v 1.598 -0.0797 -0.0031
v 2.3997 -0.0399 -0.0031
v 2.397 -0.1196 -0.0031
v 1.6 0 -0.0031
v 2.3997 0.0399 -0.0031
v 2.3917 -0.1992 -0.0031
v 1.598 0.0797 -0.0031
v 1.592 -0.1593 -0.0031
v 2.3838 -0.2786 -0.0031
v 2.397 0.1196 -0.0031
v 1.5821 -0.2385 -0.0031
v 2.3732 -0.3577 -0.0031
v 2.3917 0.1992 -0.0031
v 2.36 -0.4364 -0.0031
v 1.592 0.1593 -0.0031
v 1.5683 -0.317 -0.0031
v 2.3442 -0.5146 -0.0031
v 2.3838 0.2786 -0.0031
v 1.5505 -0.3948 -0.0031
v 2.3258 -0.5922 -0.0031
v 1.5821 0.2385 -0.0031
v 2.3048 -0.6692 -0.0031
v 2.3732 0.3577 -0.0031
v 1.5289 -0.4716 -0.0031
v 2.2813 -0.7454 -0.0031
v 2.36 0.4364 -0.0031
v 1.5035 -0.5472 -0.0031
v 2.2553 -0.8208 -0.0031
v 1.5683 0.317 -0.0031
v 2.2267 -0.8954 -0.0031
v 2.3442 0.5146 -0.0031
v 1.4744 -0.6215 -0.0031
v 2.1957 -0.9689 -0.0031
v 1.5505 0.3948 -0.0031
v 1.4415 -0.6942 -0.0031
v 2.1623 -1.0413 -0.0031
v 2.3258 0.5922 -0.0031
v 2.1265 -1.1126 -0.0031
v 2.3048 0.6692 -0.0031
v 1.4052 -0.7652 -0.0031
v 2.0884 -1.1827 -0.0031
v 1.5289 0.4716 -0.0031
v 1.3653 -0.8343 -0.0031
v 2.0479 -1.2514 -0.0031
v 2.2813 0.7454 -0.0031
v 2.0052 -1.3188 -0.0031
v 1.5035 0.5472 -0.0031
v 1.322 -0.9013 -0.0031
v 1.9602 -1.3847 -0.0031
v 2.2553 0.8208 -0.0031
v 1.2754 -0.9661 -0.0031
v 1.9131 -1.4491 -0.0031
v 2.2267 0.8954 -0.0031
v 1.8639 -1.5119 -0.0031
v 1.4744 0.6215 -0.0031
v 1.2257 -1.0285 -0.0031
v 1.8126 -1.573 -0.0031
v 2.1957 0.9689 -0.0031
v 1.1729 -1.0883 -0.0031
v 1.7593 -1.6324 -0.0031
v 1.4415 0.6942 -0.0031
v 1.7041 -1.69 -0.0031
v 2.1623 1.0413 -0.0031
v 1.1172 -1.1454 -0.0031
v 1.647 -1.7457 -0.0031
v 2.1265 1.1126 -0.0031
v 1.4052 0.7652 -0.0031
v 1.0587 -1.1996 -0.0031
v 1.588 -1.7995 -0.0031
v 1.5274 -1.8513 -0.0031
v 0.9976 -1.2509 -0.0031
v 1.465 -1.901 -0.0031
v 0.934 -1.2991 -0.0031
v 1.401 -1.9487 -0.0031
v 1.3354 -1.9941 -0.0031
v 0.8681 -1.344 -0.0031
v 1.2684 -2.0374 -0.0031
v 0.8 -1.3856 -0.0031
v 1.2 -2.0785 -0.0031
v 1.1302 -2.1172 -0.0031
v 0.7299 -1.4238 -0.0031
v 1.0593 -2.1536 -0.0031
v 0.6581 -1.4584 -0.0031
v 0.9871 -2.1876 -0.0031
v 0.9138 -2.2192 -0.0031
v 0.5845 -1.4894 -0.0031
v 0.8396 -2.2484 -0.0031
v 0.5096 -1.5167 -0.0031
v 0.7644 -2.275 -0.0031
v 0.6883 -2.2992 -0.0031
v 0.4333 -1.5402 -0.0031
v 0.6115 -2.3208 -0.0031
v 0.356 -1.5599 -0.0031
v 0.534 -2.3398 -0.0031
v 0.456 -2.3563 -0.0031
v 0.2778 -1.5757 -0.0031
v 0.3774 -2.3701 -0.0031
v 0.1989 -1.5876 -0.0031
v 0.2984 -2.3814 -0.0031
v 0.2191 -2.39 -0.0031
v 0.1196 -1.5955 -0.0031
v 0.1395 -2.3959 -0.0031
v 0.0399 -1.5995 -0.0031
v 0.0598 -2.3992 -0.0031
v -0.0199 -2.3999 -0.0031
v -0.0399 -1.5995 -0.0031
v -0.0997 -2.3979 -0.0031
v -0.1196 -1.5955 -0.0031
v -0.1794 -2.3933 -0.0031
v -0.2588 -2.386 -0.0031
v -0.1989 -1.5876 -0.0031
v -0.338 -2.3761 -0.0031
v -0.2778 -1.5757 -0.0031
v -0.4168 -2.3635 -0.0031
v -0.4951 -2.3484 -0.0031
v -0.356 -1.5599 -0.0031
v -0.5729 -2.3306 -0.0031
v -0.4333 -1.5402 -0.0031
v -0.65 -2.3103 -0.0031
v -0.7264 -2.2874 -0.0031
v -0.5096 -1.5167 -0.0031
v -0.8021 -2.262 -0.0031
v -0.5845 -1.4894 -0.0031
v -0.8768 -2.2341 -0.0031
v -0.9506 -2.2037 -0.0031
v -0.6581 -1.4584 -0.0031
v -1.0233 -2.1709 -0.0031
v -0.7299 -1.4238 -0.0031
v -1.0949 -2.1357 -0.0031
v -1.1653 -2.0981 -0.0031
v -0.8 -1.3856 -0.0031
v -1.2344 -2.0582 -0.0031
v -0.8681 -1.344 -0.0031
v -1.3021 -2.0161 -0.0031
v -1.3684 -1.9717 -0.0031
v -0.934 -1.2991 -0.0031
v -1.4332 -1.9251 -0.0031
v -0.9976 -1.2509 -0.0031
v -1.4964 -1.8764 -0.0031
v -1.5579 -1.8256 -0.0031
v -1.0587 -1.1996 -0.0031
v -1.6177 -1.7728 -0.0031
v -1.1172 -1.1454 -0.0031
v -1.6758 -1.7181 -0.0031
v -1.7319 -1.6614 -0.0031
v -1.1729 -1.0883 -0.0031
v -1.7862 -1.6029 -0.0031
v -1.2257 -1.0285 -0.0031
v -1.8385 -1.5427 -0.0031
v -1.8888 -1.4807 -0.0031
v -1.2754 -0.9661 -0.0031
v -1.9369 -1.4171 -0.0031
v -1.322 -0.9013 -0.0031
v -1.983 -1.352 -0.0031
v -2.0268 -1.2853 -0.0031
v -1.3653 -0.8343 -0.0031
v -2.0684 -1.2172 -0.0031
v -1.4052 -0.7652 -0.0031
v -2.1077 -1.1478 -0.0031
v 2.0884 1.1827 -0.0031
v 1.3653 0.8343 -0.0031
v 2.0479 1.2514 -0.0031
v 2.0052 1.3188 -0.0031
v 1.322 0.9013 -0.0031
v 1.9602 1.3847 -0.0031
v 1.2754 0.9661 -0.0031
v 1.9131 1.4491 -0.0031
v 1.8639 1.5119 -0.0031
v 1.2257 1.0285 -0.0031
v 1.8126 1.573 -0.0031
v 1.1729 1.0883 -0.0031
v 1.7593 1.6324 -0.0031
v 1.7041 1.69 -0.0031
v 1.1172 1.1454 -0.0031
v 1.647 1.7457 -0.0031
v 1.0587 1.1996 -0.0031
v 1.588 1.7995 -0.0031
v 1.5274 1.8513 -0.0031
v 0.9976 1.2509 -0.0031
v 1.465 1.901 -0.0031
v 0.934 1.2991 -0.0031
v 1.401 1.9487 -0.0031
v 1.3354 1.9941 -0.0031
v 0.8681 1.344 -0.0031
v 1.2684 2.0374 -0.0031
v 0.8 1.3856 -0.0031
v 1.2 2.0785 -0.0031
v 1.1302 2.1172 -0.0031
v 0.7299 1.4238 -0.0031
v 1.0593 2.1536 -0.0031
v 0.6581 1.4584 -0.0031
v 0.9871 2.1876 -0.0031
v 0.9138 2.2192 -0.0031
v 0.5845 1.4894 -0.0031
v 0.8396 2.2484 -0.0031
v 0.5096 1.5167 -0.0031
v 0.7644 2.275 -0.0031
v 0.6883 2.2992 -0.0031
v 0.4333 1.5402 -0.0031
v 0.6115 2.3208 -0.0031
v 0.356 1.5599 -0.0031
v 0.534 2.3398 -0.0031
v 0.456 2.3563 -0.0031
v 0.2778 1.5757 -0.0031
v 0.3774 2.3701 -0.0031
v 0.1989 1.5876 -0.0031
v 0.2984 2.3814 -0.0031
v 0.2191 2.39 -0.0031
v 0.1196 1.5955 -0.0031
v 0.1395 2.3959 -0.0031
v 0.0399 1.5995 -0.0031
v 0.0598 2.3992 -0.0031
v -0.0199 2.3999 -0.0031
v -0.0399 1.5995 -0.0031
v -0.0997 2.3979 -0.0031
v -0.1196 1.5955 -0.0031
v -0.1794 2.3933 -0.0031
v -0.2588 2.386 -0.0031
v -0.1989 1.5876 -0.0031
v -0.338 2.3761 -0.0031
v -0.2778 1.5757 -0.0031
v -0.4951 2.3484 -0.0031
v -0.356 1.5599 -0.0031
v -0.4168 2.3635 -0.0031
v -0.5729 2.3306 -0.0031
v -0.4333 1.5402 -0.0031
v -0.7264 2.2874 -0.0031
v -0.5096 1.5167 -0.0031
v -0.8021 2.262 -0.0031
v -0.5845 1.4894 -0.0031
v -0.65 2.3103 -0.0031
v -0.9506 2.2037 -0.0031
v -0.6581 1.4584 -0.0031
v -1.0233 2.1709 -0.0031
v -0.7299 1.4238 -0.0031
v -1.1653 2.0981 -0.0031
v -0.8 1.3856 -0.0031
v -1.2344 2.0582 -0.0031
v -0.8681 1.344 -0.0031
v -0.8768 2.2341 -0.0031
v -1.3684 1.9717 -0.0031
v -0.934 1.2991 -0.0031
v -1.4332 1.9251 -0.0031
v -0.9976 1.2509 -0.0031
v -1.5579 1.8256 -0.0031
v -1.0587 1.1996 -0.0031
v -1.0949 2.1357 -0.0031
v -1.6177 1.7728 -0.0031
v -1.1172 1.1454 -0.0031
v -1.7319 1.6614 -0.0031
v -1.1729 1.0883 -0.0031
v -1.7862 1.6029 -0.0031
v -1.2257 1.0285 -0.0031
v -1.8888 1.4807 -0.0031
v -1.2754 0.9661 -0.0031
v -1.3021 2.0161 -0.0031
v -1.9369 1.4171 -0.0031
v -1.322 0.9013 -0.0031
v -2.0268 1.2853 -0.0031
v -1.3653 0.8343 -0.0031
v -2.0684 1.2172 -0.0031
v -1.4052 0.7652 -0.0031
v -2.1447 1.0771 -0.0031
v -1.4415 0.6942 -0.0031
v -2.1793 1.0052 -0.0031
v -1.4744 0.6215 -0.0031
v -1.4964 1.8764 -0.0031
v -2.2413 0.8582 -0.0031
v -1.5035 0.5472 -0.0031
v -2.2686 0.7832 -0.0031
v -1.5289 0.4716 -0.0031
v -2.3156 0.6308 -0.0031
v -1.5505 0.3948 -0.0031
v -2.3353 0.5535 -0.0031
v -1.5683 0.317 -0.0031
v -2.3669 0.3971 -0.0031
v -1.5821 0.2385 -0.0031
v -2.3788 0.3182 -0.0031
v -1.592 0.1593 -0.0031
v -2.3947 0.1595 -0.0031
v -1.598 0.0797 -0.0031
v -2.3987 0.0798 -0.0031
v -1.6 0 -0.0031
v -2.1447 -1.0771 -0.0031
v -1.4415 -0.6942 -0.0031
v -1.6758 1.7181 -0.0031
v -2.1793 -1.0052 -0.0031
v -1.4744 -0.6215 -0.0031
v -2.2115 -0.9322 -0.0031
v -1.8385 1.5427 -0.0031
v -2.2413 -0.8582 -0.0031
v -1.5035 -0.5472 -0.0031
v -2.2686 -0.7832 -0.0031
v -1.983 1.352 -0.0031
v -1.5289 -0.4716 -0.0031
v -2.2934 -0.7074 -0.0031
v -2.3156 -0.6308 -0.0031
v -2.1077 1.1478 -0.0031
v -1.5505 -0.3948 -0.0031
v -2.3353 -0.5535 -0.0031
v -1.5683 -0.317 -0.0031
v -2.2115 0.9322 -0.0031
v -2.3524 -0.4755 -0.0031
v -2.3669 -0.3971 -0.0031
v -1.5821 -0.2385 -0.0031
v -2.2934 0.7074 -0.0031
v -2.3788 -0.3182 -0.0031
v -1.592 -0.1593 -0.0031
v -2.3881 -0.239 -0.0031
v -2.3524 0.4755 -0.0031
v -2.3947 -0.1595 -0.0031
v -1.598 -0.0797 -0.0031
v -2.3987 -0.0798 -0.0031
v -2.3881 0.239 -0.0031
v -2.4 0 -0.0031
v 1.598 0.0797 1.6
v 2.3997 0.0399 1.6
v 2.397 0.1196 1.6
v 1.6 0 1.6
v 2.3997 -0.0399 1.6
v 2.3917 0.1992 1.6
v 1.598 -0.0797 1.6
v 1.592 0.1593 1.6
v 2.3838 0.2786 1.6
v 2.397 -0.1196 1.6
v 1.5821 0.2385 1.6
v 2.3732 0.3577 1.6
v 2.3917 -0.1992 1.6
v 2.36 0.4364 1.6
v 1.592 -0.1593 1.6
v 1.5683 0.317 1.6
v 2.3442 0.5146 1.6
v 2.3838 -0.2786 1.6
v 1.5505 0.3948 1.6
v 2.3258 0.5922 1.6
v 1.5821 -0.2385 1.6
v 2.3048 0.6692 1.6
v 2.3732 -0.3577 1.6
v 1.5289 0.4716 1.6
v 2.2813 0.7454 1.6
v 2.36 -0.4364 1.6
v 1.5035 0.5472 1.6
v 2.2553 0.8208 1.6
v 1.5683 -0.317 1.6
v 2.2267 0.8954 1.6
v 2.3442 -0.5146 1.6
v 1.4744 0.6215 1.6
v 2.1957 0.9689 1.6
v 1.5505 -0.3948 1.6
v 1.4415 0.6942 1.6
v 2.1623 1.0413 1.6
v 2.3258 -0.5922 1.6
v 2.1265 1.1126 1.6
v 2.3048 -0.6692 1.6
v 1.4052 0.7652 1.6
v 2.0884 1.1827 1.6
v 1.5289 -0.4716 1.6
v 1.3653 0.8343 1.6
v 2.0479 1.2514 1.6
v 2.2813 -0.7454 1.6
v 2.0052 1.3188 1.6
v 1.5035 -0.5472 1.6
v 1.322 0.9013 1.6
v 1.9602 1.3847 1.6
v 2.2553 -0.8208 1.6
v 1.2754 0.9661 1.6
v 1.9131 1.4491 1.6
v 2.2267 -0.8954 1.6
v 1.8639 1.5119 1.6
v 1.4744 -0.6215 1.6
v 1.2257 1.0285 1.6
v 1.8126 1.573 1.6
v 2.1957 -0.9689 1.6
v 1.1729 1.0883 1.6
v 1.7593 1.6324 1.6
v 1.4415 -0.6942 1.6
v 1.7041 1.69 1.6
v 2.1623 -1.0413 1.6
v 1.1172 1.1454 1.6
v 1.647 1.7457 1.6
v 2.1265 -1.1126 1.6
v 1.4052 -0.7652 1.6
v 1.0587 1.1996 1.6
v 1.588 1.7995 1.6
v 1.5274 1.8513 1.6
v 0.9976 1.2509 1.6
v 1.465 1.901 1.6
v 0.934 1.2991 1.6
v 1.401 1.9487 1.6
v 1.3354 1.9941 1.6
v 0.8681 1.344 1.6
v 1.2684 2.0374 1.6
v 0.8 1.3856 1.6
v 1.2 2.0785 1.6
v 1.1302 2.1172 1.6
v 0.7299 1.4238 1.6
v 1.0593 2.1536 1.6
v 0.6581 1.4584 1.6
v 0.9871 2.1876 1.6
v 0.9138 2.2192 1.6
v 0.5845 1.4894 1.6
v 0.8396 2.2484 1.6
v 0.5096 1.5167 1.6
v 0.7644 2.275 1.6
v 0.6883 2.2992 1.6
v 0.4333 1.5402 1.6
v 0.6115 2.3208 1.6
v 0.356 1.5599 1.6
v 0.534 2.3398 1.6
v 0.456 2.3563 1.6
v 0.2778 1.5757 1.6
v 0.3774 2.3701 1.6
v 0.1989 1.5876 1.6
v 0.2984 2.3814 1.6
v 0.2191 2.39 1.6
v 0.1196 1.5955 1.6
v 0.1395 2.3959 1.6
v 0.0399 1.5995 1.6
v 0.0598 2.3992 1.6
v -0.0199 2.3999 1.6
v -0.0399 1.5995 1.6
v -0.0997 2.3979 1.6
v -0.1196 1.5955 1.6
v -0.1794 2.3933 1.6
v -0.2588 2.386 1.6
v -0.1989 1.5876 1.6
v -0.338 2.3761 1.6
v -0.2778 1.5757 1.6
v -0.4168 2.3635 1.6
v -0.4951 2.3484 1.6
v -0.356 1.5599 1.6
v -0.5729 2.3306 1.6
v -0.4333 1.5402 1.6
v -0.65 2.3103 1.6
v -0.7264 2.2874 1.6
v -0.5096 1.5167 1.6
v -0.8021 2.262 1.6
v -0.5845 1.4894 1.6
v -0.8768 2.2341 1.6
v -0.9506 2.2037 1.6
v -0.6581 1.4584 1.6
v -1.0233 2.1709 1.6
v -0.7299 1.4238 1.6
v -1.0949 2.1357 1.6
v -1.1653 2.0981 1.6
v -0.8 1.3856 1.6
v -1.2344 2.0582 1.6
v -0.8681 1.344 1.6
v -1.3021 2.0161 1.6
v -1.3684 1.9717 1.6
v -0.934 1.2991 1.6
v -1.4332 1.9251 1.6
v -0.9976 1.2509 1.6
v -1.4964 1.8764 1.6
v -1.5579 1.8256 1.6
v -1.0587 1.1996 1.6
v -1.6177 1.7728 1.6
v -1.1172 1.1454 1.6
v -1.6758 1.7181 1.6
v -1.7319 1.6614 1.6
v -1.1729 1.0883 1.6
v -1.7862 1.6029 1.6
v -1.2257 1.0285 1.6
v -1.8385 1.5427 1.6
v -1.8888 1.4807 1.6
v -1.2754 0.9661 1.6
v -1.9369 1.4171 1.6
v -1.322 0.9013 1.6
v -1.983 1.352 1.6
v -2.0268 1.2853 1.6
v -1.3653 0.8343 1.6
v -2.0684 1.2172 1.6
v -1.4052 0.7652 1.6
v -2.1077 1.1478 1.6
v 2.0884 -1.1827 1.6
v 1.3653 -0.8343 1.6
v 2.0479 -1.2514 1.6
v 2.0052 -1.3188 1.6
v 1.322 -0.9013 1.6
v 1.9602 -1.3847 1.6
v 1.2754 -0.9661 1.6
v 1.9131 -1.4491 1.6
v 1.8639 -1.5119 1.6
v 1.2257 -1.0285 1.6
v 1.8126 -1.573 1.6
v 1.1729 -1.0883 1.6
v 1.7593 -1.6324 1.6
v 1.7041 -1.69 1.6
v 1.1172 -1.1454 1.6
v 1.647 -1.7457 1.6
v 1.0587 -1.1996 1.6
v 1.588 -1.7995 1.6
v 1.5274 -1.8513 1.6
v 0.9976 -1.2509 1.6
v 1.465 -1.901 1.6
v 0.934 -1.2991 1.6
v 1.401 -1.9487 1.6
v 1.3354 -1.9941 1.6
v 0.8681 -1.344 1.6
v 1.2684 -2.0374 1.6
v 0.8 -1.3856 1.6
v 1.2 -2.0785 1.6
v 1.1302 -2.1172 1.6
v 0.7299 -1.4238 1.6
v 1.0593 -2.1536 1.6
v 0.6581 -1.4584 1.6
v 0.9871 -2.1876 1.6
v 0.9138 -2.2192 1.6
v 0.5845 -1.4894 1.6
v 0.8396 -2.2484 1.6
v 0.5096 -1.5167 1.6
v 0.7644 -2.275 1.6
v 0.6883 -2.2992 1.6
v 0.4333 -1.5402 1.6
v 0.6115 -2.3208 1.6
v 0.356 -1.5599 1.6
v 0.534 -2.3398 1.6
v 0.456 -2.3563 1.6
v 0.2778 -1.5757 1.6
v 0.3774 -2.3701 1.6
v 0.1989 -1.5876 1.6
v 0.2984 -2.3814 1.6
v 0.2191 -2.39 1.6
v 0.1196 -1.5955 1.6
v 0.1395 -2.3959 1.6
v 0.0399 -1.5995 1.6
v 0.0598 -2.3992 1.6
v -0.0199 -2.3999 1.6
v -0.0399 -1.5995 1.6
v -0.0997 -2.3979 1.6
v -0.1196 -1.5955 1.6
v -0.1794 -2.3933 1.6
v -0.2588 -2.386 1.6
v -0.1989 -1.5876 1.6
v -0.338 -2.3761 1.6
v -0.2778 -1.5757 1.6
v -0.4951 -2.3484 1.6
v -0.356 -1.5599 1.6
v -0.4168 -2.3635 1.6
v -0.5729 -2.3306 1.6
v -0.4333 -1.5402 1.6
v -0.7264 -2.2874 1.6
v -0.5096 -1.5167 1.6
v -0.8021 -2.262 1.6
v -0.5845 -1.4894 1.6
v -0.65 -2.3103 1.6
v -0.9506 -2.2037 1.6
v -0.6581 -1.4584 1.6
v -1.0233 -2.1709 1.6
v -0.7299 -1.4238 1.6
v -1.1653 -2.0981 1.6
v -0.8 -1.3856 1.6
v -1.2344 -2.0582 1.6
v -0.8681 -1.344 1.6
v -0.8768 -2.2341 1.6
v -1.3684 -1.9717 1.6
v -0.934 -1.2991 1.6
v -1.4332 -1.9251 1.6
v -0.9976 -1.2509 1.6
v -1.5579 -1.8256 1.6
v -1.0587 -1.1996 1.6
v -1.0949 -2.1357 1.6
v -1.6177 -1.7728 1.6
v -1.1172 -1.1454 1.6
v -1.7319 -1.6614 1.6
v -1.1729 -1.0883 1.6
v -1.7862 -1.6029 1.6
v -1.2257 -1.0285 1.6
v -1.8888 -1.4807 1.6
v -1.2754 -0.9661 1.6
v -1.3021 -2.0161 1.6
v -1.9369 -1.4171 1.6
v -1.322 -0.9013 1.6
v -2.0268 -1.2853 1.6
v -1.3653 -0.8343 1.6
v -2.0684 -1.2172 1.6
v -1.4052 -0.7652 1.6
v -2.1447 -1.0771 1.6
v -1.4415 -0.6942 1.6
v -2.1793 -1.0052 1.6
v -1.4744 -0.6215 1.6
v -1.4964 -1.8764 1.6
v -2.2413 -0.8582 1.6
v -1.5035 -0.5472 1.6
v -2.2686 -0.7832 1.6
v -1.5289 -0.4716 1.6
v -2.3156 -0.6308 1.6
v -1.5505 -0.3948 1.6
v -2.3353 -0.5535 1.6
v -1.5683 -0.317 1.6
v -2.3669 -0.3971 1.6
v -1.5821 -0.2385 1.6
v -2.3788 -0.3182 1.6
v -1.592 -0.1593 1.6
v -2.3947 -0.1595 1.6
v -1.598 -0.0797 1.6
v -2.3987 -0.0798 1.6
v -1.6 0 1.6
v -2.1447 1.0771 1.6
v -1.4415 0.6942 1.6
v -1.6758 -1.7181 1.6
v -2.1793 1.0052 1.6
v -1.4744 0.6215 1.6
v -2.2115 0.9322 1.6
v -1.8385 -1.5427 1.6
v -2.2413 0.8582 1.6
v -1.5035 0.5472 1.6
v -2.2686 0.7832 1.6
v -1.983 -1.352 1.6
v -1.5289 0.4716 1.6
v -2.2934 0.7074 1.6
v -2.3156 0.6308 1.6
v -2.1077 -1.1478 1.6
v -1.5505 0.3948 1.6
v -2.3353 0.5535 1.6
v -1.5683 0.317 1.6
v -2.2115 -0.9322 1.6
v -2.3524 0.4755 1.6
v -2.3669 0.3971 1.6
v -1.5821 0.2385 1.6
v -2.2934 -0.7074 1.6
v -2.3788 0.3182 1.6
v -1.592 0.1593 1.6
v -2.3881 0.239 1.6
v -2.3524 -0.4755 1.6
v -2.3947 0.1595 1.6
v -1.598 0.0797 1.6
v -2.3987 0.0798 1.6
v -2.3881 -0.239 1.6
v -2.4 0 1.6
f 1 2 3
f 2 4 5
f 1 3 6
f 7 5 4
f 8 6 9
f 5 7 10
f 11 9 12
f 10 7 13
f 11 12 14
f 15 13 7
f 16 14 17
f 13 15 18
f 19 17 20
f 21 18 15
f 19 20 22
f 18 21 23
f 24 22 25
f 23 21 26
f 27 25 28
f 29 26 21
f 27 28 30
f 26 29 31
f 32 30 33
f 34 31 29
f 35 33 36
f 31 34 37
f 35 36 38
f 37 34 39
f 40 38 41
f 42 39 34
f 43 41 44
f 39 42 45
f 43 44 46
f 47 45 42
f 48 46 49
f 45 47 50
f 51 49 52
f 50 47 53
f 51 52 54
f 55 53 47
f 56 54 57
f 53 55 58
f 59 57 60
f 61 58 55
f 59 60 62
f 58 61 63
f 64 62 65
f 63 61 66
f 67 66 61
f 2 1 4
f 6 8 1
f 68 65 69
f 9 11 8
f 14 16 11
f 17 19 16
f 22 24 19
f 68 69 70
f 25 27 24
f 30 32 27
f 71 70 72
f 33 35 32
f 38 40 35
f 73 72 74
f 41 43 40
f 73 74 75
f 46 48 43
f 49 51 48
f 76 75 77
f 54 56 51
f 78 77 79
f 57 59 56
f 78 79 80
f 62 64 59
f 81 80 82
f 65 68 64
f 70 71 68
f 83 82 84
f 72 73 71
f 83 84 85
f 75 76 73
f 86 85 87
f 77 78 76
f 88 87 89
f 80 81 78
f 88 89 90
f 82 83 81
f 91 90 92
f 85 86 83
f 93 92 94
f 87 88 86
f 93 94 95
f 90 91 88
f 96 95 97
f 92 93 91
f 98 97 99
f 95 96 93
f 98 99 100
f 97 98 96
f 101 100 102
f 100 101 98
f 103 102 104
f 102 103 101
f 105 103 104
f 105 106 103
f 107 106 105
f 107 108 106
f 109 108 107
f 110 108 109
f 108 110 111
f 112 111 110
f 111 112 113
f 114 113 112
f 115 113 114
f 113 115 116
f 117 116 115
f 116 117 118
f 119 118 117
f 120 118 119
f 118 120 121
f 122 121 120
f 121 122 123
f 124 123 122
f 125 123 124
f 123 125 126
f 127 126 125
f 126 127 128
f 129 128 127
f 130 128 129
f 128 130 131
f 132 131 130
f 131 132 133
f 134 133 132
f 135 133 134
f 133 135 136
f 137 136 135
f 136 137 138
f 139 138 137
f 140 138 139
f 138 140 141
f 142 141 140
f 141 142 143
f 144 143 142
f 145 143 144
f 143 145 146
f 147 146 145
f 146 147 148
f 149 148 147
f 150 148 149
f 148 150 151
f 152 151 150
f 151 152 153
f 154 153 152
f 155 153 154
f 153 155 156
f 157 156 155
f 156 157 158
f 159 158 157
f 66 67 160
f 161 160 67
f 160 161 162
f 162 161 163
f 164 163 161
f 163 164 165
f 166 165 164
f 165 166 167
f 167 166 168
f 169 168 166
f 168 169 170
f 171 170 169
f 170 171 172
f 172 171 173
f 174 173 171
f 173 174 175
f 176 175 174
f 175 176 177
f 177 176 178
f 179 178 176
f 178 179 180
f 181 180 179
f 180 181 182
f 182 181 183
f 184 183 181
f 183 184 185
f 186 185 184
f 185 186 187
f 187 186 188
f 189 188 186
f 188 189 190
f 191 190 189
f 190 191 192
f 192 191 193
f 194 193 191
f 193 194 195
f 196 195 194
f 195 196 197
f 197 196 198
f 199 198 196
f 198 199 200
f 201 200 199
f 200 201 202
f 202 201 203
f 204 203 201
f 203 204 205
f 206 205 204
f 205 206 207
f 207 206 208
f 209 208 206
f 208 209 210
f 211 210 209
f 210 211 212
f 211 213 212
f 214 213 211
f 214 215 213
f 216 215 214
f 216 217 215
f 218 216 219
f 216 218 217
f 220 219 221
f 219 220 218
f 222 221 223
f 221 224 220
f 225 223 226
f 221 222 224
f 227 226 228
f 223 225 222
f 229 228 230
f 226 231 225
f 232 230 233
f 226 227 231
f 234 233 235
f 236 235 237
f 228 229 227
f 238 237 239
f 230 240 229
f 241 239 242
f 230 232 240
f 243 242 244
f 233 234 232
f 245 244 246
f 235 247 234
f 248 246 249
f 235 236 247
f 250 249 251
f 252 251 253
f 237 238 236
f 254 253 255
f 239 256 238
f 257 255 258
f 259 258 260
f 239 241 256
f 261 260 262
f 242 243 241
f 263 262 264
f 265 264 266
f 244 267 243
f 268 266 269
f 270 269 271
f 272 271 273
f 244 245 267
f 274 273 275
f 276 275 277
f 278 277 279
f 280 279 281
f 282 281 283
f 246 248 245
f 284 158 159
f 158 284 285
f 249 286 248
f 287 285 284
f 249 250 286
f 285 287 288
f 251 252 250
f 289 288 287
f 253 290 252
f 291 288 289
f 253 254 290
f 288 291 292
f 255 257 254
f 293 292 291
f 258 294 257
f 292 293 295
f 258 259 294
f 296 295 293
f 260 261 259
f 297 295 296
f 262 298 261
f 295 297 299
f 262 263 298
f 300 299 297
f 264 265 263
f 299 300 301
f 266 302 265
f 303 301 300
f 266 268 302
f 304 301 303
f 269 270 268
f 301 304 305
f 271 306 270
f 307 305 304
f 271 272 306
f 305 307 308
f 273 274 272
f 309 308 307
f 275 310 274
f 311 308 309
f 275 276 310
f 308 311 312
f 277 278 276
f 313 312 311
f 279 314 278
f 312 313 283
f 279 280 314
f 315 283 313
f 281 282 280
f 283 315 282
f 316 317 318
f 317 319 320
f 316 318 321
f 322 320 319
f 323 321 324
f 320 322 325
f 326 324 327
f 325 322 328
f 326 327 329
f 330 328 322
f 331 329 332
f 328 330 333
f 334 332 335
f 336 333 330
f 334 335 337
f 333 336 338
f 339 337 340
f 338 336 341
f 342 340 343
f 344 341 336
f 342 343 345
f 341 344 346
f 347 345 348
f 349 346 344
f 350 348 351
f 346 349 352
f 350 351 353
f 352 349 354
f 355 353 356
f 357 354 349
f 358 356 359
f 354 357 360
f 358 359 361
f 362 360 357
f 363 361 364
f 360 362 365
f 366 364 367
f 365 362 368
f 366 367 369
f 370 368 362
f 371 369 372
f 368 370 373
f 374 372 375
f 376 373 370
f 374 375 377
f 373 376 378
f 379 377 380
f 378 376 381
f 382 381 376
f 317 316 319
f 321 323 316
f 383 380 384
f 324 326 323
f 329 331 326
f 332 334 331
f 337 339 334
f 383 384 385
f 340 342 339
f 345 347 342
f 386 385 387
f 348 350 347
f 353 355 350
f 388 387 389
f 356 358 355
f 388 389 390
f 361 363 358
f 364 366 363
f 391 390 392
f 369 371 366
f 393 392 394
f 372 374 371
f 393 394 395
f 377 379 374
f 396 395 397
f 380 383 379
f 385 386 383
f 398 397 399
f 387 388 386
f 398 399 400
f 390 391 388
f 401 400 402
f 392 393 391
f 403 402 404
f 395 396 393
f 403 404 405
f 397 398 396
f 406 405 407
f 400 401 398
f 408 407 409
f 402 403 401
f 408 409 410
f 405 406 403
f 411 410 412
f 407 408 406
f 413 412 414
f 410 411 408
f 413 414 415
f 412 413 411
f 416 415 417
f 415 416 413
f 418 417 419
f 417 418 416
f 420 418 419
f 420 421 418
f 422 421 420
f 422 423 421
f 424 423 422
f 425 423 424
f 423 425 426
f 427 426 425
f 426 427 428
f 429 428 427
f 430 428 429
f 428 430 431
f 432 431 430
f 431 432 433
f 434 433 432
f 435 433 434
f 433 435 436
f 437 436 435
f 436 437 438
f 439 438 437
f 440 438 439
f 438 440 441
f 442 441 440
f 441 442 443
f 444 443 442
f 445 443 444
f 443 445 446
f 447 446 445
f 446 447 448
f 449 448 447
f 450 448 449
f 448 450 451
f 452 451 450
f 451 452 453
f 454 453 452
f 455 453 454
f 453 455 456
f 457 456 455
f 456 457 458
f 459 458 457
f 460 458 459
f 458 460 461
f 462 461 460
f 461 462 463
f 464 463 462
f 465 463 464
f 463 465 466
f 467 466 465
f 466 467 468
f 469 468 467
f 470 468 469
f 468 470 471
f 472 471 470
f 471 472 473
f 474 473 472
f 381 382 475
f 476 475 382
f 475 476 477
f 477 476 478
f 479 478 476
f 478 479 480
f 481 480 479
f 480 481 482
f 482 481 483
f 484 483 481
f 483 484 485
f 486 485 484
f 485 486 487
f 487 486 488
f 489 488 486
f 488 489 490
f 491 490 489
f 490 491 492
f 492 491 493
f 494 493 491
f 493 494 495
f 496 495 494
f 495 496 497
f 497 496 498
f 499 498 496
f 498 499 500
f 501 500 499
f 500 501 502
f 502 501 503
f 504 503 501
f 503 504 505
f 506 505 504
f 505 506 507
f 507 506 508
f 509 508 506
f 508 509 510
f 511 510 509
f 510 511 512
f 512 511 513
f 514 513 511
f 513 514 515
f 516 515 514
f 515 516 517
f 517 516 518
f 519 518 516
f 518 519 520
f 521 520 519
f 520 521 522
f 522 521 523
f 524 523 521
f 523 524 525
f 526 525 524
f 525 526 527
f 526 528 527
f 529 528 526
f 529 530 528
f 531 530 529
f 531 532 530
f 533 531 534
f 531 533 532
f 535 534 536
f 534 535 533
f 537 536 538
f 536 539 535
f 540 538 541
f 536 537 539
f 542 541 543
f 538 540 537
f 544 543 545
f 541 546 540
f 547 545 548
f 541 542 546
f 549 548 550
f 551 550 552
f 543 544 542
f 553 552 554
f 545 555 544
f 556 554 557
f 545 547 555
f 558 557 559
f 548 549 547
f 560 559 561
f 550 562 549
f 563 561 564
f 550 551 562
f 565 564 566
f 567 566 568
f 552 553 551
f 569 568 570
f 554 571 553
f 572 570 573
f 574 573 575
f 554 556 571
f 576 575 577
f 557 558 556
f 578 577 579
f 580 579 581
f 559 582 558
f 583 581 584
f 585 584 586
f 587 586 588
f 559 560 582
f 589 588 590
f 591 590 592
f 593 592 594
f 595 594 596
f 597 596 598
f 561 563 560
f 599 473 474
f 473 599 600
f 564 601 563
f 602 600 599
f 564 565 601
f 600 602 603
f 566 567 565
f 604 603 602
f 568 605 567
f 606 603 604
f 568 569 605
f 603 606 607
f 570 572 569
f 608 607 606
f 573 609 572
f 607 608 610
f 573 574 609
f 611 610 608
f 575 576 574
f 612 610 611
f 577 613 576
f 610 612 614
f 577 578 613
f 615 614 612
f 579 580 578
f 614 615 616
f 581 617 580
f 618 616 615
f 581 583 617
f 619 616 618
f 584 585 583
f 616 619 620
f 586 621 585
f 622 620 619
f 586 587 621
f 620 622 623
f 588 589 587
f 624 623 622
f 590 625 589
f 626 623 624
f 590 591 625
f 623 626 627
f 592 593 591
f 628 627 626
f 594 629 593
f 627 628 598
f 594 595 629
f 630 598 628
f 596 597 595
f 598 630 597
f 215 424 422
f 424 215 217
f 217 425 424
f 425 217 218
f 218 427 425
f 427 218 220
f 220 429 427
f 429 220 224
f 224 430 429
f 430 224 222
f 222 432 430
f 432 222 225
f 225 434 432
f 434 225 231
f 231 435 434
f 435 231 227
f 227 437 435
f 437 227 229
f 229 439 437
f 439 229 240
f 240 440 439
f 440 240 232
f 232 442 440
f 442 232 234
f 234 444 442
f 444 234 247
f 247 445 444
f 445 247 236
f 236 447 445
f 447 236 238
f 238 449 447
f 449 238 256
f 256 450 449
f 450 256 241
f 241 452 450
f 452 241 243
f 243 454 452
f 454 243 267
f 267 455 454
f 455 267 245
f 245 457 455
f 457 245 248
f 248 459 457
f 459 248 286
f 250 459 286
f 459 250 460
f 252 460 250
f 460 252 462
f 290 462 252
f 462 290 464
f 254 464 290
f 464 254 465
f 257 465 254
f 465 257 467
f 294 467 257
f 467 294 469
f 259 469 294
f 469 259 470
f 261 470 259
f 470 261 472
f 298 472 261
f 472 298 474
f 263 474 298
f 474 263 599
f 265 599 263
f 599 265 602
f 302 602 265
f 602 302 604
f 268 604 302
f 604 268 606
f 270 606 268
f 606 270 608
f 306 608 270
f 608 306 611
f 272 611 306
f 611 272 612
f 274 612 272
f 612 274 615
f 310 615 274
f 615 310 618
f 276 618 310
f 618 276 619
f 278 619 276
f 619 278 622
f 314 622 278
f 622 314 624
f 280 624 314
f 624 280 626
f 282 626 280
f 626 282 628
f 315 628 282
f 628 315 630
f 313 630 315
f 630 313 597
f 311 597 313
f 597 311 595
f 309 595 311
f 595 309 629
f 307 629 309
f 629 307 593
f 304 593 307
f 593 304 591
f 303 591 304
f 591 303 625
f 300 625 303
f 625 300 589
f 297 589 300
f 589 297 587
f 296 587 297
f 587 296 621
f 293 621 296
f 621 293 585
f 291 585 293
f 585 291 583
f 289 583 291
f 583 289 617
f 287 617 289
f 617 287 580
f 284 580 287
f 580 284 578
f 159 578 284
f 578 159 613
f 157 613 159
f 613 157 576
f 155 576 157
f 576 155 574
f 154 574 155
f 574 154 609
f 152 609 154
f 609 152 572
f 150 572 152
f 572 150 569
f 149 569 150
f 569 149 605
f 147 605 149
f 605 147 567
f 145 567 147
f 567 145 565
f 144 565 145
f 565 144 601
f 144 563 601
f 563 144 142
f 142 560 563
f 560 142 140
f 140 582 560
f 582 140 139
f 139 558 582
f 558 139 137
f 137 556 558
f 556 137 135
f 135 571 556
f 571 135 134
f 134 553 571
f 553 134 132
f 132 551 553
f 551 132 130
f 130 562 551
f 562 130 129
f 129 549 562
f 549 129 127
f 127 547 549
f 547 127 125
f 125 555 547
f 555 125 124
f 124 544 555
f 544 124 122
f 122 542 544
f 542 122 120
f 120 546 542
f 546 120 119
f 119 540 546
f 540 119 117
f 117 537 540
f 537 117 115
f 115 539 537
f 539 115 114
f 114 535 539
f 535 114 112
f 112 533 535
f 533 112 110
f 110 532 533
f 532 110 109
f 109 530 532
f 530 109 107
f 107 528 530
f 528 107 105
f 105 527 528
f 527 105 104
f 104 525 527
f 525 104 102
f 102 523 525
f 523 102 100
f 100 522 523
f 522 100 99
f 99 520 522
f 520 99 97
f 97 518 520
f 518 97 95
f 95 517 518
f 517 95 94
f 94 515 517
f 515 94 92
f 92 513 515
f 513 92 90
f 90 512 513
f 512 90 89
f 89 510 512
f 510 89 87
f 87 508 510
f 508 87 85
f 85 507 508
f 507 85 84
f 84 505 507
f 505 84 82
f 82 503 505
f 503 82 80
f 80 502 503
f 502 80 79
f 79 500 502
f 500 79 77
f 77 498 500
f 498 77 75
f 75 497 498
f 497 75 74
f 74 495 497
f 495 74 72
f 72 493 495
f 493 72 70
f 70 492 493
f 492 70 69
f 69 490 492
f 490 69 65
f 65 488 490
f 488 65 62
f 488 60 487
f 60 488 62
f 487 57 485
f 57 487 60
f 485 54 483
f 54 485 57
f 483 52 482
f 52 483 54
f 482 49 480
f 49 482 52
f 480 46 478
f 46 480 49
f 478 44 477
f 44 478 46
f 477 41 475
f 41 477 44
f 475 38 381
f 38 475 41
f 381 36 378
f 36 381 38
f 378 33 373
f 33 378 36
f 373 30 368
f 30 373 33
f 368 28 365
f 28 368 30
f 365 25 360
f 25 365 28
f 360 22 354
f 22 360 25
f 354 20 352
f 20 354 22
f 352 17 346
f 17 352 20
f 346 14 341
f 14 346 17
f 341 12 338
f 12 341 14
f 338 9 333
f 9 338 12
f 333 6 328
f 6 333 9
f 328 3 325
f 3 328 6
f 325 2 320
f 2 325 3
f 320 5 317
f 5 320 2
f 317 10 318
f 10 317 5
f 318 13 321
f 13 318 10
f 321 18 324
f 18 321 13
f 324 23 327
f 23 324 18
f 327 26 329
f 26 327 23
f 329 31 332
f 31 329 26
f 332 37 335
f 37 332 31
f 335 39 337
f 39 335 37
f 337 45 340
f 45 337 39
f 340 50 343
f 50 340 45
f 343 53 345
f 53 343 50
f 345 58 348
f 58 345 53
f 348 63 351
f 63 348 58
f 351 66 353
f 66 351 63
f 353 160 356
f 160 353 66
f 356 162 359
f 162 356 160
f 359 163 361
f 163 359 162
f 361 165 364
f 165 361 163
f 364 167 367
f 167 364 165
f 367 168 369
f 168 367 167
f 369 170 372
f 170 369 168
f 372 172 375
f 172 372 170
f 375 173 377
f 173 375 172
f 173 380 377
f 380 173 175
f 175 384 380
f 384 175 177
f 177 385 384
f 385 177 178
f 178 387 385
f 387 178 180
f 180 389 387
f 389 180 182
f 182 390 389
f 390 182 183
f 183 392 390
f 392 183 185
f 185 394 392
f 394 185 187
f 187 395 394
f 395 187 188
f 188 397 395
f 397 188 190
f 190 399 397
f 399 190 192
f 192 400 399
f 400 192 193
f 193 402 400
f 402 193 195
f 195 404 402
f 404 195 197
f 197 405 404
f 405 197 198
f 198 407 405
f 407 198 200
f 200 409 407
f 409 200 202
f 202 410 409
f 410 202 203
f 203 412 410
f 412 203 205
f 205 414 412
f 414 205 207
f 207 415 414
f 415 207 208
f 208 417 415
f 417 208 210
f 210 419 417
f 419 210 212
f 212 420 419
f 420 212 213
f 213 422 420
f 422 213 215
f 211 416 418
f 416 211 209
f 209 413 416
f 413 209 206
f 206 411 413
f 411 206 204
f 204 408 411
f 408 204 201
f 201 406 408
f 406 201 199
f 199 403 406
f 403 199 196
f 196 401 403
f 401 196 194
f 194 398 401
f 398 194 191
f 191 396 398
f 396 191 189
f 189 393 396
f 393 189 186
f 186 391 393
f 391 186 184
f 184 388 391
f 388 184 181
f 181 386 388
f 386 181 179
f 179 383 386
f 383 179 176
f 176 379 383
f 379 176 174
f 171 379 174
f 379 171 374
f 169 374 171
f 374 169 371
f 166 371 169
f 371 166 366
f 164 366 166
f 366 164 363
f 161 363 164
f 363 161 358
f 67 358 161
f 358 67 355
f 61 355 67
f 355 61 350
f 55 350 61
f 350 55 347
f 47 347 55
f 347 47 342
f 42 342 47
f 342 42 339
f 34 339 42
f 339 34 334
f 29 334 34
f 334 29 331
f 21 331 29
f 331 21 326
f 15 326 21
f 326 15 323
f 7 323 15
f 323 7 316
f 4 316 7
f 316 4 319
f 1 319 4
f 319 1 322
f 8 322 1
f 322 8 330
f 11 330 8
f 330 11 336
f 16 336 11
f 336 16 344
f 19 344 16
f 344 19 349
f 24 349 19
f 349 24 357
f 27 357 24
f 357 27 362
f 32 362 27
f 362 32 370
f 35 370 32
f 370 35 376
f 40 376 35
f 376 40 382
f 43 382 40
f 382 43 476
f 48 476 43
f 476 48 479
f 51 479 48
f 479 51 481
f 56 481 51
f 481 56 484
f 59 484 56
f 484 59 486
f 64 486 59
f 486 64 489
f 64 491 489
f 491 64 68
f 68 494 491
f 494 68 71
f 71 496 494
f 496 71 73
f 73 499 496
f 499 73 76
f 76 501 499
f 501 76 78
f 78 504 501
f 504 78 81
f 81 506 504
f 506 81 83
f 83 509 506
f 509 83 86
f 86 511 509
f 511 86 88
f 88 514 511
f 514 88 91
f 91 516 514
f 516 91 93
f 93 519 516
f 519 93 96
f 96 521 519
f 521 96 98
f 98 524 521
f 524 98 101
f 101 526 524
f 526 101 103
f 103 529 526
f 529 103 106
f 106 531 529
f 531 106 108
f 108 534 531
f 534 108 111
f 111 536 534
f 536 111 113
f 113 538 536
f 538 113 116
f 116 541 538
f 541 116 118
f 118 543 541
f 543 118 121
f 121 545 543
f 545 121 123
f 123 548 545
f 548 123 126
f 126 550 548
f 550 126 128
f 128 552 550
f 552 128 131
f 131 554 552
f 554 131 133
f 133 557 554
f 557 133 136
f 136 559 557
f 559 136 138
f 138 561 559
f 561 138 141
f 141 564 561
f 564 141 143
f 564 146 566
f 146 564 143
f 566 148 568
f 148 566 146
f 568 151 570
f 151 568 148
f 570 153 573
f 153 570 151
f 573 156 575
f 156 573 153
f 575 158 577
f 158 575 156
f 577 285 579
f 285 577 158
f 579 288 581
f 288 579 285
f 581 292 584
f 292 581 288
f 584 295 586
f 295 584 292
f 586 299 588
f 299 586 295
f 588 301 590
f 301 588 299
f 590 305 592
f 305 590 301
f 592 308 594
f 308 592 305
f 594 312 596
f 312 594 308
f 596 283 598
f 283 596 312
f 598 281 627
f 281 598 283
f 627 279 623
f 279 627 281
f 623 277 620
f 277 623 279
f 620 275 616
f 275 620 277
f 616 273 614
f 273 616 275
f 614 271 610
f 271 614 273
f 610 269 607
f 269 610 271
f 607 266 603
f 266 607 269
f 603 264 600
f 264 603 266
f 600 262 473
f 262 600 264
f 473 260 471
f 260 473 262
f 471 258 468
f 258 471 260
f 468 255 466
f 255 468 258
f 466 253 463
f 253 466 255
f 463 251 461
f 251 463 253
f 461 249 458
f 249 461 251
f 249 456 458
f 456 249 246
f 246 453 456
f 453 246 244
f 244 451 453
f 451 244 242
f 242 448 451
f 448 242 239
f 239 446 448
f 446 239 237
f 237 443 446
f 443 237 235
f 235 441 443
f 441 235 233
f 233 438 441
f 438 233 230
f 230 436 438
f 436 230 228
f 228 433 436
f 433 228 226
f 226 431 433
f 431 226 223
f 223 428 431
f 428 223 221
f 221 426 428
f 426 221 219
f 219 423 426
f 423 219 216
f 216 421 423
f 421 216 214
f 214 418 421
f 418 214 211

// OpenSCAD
use <../lib.scad>
use <../p/1-16cyli.scad>
use <s/3626cpcbes01.scad>
use <s/3626cs01.scad>
use <../p/t16o6250.scad>
$fa=1; $fs=0.2;
function ldraw_lib__3626cpcbe(realsolid=false) = [
// 0 Minifig Head with Brown Bushy Moustache and Eyebrows and Black Chin Strap Pattern
// 0 Name: 3626cpcbe.dat
// 0 Author: Philippe Hurbain [Philo]
// 0 !LDRAW_ORG Part UPDATE 2015-02
// 0 !LICENSE Licensed under CC BY 2.0 and CC BY 4.0 : see CAreadme.txt
// 
// 0 BFC CERTIFY CCW
  [0,"BFC","CERTIFY"],
  [0,"BFC","CCW"],
// 
// 0 !KEYWORDS Bobby, Constable, Series 11
// 
// 0 !HISTORY 2015-12-30 [PTadmin] Official Update 2015-02
// 
// 
// 1 16 0 0 0 1 0 0 0 1 0 0 0 1 s\3626cs01.dat
  [1,16,0,0,0,1,0,0,0,1,0,0,0,1, ldraw_lib__s__3626cs01(realsolid)],
// 1 16 0 0 0 -1 0 0 0 1 0 0 0 1 s\3626cpcbes01.dat
  [1,16,0,0,0,-1,0,0,0,1,0,0,0,1, ldraw_lib__s__3626cpcbes01(realsolid)],
// 1 16 0 0 0 1 0 0 0 1 0 0 0 1 s\3626cpcbes01.dat
  [1,16,0,0,0,1,0,0,0,1,0,0,0,1, ldraw_lib__s__3626cpcbes01(realsolid)],
// 1 16 0 17 0 8 0 0 0 6.4 0 0 0 -8 t16o6250.dat
  [1,16,0,17,0,8,0,0,0,6.4,0,0,0,-8, ldraw_lib__t16o6250(realsolid)],
// 1 16 0 17 0 -8 0 0 0 6.4 0 0 0 -8 t16o6250.dat
  [1,16,0,17,0,-8,0,0,0,6.4,0,0,0,-8, ldraw_lib__t16o6250(realsolid)],
// 1 16 0 4 0 8 0 0 0 -6.4 0 0 0 -8 t16o6250.dat
  [1,16,0,4,0,8,0,0,0,-6.4,0,0,0,-8, ldraw_lib__t16o6250(realsolid)],
// 1 16 0 4 0 -8 0 0 0 -6.4 0 0 0 -8 t16o6250.dat
  [1,16,0,4,0,-8,0,0,0,-6.4,0,0,0,-8, ldraw_lib__t16o6250(realsolid)],
// 1 16 0 4 0 13 0 0 0 13 0 0 0 -13 1-16cyli.dat
  [1,16,0,4,0,13,0,0,0,13,0,0,0,-13, ldraw_lib__1_16cyli(realsolid)],
// 1 16 0 4 0 -13 0 0 0 13 0 0 0 -13 1-16cyli.dat
  [1,16,0,4,0,-13,0,0,0,13,0,0,0,-13, ldraw_lib__1_16cyli(realsolid)],
// 4 0 -9.1923 13.27 -9.1923 -9.51 12.07 -8.7169 -9.74 12.16 -8.3728 -9.57 13.17 -8.6271
  [4,0,-9.1923,13.27,-9.1923,-9.51,12.07,-8.7169,-9.74,12.16,-8.3728,-9.57,13.17,-8.6271],
// 4 0 -9.1923 13.27 -9.1923 -9.57 13.17 -8.6271 -9.29 14.1 -9.0461 -9.1923 14.16 -9.1923
  [4,0,-9.1923,13.27,-9.1923,-9.57,13.17,-8.6271,-9.29,14.1,-9.0461,-9.1923,14.16,-9.1923],
// 3 0 -9.1923 14.16 -9.1923 -8.9 14.1 -9.3877 -9.1923 13.27 -9.1923
  [3,0,-9.1923,14.16,-9.1923,-8.9,14.1,-9.3877,-9.1923,13.27,-9.1923],
// 4 0 -7.5 11.69 -10.3233 -7.63 11.62 -10.2364 -7.93 11.7 -10.0359 -7.26 12.46 -10.4837
  [4,0,-7.5,11.69,-10.3233,-7.63,11.62,-10.2364,-7.93,11.7,-10.0359,-7.26,12.46,-10.4837],
// 4 0 -7.26 12.46 -10.4837 -7.93 11.7 -10.0359 -7.63 12.81 -10.2364 -6.92 13.3 -10.7109
  [4,0,-7.26,12.46,-10.4837,-7.93,11.7,-10.0359,-7.63,12.81,-10.2364,-6.92,13.3,-10.7109],
// 4 0 -6.98 13.46 -10.6708 -6.92 13.3 -10.7109 -7.63 12.81 -10.2364 -7.27 13.59 -10.477
  [4,0,-6.98,13.46,-10.6708,-6.92,13.3,-10.7109,-7.63,12.81,-10.2364,-7.27,13.59,-10.477],
// 3 0 -9.78 12.27 -8.3129 -9.57 13.17 -8.6271 -9.74 12.16 -8.3728
  [3,0,-9.78,12.27,-8.3129,-9.57,13.17,-8.6271,-9.74,12.16,-8.3728],
// 4 16 9.74 12.16 -8.3728 9.51 12.07 -8.7169 9.1923 13.27 -9.1923 9.57 13.17 -8.6271
  [4,16,9.74,12.16,-8.3728,9.51,12.07,-8.7169,9.1923,13.27,-9.1923,9.57,13.17,-8.6271],
// 4 16 9.29 14.1 -9.0461 9.57 13.17 -8.6271 9.1923 13.27 -9.1923 9.1923 14.16 -9.1923
  [4,16,9.29,14.1,-9.0461,9.57,13.17,-8.6271,9.1923,13.27,-9.1923,9.1923,14.16,-9.1923],
// 3 16 9.1923 13.27 -9.1923 8.9 14.1 -9.3877 9.1923 14.16 -9.1923
  [3,16,9.1923,13.27,-9.1923,8.9,14.1,-9.3877,9.1923,14.16,-9.1923],
// 4 16 7.93 11.7 -10.0359 7.63 11.62 -10.2364 7.5 11.69 -10.3233 7.26 12.46 -10.4837
  [4,16,7.93,11.7,-10.0359,7.63,11.62,-10.2364,7.5,11.69,-10.3233,7.26,12.46,-10.4837],
// 4 16 7.63 12.81 -10.2364 7.93 11.7 -10.0359 7.26 12.46 -10.4837 6.92 13.3 -10.7109
  [4,16,7.63,12.81,-10.2364,7.93,11.7,-10.0359,7.26,12.46,-10.4837,6.92,13.3,-10.7109],
// 4 16 7.63 12.81 -10.2364 6.92 13.3 -10.7109 6.98 13.46 -10.6708 7.27 13.59 -10.477
  [4,16,7.63,12.81,-10.2364,6.92,13.3,-10.7109,6.98,13.46,-10.6708,7.27,13.59,-10.477],
// 3 16 9.74 12.16 -8.3728 9.57 13.17 -8.6271 9.78 12.27 -8.3129
  [3,16,9.74,12.16,-8.3728,9.57,13.17,-8.6271,9.78,12.27,-8.3129],
];
module ldraw_lib__3626cpcbe(step=0, col=false, unit=2/5, alt=false, line=0.2, solid=!$preview)
    makepoly(ldraw_lib__3626cpcbe(solid), step=step, col=col, unit=unit, alt=alt, line=line, solid=solid);
ldraw_lib__3626cpcbe(line=0.2);
